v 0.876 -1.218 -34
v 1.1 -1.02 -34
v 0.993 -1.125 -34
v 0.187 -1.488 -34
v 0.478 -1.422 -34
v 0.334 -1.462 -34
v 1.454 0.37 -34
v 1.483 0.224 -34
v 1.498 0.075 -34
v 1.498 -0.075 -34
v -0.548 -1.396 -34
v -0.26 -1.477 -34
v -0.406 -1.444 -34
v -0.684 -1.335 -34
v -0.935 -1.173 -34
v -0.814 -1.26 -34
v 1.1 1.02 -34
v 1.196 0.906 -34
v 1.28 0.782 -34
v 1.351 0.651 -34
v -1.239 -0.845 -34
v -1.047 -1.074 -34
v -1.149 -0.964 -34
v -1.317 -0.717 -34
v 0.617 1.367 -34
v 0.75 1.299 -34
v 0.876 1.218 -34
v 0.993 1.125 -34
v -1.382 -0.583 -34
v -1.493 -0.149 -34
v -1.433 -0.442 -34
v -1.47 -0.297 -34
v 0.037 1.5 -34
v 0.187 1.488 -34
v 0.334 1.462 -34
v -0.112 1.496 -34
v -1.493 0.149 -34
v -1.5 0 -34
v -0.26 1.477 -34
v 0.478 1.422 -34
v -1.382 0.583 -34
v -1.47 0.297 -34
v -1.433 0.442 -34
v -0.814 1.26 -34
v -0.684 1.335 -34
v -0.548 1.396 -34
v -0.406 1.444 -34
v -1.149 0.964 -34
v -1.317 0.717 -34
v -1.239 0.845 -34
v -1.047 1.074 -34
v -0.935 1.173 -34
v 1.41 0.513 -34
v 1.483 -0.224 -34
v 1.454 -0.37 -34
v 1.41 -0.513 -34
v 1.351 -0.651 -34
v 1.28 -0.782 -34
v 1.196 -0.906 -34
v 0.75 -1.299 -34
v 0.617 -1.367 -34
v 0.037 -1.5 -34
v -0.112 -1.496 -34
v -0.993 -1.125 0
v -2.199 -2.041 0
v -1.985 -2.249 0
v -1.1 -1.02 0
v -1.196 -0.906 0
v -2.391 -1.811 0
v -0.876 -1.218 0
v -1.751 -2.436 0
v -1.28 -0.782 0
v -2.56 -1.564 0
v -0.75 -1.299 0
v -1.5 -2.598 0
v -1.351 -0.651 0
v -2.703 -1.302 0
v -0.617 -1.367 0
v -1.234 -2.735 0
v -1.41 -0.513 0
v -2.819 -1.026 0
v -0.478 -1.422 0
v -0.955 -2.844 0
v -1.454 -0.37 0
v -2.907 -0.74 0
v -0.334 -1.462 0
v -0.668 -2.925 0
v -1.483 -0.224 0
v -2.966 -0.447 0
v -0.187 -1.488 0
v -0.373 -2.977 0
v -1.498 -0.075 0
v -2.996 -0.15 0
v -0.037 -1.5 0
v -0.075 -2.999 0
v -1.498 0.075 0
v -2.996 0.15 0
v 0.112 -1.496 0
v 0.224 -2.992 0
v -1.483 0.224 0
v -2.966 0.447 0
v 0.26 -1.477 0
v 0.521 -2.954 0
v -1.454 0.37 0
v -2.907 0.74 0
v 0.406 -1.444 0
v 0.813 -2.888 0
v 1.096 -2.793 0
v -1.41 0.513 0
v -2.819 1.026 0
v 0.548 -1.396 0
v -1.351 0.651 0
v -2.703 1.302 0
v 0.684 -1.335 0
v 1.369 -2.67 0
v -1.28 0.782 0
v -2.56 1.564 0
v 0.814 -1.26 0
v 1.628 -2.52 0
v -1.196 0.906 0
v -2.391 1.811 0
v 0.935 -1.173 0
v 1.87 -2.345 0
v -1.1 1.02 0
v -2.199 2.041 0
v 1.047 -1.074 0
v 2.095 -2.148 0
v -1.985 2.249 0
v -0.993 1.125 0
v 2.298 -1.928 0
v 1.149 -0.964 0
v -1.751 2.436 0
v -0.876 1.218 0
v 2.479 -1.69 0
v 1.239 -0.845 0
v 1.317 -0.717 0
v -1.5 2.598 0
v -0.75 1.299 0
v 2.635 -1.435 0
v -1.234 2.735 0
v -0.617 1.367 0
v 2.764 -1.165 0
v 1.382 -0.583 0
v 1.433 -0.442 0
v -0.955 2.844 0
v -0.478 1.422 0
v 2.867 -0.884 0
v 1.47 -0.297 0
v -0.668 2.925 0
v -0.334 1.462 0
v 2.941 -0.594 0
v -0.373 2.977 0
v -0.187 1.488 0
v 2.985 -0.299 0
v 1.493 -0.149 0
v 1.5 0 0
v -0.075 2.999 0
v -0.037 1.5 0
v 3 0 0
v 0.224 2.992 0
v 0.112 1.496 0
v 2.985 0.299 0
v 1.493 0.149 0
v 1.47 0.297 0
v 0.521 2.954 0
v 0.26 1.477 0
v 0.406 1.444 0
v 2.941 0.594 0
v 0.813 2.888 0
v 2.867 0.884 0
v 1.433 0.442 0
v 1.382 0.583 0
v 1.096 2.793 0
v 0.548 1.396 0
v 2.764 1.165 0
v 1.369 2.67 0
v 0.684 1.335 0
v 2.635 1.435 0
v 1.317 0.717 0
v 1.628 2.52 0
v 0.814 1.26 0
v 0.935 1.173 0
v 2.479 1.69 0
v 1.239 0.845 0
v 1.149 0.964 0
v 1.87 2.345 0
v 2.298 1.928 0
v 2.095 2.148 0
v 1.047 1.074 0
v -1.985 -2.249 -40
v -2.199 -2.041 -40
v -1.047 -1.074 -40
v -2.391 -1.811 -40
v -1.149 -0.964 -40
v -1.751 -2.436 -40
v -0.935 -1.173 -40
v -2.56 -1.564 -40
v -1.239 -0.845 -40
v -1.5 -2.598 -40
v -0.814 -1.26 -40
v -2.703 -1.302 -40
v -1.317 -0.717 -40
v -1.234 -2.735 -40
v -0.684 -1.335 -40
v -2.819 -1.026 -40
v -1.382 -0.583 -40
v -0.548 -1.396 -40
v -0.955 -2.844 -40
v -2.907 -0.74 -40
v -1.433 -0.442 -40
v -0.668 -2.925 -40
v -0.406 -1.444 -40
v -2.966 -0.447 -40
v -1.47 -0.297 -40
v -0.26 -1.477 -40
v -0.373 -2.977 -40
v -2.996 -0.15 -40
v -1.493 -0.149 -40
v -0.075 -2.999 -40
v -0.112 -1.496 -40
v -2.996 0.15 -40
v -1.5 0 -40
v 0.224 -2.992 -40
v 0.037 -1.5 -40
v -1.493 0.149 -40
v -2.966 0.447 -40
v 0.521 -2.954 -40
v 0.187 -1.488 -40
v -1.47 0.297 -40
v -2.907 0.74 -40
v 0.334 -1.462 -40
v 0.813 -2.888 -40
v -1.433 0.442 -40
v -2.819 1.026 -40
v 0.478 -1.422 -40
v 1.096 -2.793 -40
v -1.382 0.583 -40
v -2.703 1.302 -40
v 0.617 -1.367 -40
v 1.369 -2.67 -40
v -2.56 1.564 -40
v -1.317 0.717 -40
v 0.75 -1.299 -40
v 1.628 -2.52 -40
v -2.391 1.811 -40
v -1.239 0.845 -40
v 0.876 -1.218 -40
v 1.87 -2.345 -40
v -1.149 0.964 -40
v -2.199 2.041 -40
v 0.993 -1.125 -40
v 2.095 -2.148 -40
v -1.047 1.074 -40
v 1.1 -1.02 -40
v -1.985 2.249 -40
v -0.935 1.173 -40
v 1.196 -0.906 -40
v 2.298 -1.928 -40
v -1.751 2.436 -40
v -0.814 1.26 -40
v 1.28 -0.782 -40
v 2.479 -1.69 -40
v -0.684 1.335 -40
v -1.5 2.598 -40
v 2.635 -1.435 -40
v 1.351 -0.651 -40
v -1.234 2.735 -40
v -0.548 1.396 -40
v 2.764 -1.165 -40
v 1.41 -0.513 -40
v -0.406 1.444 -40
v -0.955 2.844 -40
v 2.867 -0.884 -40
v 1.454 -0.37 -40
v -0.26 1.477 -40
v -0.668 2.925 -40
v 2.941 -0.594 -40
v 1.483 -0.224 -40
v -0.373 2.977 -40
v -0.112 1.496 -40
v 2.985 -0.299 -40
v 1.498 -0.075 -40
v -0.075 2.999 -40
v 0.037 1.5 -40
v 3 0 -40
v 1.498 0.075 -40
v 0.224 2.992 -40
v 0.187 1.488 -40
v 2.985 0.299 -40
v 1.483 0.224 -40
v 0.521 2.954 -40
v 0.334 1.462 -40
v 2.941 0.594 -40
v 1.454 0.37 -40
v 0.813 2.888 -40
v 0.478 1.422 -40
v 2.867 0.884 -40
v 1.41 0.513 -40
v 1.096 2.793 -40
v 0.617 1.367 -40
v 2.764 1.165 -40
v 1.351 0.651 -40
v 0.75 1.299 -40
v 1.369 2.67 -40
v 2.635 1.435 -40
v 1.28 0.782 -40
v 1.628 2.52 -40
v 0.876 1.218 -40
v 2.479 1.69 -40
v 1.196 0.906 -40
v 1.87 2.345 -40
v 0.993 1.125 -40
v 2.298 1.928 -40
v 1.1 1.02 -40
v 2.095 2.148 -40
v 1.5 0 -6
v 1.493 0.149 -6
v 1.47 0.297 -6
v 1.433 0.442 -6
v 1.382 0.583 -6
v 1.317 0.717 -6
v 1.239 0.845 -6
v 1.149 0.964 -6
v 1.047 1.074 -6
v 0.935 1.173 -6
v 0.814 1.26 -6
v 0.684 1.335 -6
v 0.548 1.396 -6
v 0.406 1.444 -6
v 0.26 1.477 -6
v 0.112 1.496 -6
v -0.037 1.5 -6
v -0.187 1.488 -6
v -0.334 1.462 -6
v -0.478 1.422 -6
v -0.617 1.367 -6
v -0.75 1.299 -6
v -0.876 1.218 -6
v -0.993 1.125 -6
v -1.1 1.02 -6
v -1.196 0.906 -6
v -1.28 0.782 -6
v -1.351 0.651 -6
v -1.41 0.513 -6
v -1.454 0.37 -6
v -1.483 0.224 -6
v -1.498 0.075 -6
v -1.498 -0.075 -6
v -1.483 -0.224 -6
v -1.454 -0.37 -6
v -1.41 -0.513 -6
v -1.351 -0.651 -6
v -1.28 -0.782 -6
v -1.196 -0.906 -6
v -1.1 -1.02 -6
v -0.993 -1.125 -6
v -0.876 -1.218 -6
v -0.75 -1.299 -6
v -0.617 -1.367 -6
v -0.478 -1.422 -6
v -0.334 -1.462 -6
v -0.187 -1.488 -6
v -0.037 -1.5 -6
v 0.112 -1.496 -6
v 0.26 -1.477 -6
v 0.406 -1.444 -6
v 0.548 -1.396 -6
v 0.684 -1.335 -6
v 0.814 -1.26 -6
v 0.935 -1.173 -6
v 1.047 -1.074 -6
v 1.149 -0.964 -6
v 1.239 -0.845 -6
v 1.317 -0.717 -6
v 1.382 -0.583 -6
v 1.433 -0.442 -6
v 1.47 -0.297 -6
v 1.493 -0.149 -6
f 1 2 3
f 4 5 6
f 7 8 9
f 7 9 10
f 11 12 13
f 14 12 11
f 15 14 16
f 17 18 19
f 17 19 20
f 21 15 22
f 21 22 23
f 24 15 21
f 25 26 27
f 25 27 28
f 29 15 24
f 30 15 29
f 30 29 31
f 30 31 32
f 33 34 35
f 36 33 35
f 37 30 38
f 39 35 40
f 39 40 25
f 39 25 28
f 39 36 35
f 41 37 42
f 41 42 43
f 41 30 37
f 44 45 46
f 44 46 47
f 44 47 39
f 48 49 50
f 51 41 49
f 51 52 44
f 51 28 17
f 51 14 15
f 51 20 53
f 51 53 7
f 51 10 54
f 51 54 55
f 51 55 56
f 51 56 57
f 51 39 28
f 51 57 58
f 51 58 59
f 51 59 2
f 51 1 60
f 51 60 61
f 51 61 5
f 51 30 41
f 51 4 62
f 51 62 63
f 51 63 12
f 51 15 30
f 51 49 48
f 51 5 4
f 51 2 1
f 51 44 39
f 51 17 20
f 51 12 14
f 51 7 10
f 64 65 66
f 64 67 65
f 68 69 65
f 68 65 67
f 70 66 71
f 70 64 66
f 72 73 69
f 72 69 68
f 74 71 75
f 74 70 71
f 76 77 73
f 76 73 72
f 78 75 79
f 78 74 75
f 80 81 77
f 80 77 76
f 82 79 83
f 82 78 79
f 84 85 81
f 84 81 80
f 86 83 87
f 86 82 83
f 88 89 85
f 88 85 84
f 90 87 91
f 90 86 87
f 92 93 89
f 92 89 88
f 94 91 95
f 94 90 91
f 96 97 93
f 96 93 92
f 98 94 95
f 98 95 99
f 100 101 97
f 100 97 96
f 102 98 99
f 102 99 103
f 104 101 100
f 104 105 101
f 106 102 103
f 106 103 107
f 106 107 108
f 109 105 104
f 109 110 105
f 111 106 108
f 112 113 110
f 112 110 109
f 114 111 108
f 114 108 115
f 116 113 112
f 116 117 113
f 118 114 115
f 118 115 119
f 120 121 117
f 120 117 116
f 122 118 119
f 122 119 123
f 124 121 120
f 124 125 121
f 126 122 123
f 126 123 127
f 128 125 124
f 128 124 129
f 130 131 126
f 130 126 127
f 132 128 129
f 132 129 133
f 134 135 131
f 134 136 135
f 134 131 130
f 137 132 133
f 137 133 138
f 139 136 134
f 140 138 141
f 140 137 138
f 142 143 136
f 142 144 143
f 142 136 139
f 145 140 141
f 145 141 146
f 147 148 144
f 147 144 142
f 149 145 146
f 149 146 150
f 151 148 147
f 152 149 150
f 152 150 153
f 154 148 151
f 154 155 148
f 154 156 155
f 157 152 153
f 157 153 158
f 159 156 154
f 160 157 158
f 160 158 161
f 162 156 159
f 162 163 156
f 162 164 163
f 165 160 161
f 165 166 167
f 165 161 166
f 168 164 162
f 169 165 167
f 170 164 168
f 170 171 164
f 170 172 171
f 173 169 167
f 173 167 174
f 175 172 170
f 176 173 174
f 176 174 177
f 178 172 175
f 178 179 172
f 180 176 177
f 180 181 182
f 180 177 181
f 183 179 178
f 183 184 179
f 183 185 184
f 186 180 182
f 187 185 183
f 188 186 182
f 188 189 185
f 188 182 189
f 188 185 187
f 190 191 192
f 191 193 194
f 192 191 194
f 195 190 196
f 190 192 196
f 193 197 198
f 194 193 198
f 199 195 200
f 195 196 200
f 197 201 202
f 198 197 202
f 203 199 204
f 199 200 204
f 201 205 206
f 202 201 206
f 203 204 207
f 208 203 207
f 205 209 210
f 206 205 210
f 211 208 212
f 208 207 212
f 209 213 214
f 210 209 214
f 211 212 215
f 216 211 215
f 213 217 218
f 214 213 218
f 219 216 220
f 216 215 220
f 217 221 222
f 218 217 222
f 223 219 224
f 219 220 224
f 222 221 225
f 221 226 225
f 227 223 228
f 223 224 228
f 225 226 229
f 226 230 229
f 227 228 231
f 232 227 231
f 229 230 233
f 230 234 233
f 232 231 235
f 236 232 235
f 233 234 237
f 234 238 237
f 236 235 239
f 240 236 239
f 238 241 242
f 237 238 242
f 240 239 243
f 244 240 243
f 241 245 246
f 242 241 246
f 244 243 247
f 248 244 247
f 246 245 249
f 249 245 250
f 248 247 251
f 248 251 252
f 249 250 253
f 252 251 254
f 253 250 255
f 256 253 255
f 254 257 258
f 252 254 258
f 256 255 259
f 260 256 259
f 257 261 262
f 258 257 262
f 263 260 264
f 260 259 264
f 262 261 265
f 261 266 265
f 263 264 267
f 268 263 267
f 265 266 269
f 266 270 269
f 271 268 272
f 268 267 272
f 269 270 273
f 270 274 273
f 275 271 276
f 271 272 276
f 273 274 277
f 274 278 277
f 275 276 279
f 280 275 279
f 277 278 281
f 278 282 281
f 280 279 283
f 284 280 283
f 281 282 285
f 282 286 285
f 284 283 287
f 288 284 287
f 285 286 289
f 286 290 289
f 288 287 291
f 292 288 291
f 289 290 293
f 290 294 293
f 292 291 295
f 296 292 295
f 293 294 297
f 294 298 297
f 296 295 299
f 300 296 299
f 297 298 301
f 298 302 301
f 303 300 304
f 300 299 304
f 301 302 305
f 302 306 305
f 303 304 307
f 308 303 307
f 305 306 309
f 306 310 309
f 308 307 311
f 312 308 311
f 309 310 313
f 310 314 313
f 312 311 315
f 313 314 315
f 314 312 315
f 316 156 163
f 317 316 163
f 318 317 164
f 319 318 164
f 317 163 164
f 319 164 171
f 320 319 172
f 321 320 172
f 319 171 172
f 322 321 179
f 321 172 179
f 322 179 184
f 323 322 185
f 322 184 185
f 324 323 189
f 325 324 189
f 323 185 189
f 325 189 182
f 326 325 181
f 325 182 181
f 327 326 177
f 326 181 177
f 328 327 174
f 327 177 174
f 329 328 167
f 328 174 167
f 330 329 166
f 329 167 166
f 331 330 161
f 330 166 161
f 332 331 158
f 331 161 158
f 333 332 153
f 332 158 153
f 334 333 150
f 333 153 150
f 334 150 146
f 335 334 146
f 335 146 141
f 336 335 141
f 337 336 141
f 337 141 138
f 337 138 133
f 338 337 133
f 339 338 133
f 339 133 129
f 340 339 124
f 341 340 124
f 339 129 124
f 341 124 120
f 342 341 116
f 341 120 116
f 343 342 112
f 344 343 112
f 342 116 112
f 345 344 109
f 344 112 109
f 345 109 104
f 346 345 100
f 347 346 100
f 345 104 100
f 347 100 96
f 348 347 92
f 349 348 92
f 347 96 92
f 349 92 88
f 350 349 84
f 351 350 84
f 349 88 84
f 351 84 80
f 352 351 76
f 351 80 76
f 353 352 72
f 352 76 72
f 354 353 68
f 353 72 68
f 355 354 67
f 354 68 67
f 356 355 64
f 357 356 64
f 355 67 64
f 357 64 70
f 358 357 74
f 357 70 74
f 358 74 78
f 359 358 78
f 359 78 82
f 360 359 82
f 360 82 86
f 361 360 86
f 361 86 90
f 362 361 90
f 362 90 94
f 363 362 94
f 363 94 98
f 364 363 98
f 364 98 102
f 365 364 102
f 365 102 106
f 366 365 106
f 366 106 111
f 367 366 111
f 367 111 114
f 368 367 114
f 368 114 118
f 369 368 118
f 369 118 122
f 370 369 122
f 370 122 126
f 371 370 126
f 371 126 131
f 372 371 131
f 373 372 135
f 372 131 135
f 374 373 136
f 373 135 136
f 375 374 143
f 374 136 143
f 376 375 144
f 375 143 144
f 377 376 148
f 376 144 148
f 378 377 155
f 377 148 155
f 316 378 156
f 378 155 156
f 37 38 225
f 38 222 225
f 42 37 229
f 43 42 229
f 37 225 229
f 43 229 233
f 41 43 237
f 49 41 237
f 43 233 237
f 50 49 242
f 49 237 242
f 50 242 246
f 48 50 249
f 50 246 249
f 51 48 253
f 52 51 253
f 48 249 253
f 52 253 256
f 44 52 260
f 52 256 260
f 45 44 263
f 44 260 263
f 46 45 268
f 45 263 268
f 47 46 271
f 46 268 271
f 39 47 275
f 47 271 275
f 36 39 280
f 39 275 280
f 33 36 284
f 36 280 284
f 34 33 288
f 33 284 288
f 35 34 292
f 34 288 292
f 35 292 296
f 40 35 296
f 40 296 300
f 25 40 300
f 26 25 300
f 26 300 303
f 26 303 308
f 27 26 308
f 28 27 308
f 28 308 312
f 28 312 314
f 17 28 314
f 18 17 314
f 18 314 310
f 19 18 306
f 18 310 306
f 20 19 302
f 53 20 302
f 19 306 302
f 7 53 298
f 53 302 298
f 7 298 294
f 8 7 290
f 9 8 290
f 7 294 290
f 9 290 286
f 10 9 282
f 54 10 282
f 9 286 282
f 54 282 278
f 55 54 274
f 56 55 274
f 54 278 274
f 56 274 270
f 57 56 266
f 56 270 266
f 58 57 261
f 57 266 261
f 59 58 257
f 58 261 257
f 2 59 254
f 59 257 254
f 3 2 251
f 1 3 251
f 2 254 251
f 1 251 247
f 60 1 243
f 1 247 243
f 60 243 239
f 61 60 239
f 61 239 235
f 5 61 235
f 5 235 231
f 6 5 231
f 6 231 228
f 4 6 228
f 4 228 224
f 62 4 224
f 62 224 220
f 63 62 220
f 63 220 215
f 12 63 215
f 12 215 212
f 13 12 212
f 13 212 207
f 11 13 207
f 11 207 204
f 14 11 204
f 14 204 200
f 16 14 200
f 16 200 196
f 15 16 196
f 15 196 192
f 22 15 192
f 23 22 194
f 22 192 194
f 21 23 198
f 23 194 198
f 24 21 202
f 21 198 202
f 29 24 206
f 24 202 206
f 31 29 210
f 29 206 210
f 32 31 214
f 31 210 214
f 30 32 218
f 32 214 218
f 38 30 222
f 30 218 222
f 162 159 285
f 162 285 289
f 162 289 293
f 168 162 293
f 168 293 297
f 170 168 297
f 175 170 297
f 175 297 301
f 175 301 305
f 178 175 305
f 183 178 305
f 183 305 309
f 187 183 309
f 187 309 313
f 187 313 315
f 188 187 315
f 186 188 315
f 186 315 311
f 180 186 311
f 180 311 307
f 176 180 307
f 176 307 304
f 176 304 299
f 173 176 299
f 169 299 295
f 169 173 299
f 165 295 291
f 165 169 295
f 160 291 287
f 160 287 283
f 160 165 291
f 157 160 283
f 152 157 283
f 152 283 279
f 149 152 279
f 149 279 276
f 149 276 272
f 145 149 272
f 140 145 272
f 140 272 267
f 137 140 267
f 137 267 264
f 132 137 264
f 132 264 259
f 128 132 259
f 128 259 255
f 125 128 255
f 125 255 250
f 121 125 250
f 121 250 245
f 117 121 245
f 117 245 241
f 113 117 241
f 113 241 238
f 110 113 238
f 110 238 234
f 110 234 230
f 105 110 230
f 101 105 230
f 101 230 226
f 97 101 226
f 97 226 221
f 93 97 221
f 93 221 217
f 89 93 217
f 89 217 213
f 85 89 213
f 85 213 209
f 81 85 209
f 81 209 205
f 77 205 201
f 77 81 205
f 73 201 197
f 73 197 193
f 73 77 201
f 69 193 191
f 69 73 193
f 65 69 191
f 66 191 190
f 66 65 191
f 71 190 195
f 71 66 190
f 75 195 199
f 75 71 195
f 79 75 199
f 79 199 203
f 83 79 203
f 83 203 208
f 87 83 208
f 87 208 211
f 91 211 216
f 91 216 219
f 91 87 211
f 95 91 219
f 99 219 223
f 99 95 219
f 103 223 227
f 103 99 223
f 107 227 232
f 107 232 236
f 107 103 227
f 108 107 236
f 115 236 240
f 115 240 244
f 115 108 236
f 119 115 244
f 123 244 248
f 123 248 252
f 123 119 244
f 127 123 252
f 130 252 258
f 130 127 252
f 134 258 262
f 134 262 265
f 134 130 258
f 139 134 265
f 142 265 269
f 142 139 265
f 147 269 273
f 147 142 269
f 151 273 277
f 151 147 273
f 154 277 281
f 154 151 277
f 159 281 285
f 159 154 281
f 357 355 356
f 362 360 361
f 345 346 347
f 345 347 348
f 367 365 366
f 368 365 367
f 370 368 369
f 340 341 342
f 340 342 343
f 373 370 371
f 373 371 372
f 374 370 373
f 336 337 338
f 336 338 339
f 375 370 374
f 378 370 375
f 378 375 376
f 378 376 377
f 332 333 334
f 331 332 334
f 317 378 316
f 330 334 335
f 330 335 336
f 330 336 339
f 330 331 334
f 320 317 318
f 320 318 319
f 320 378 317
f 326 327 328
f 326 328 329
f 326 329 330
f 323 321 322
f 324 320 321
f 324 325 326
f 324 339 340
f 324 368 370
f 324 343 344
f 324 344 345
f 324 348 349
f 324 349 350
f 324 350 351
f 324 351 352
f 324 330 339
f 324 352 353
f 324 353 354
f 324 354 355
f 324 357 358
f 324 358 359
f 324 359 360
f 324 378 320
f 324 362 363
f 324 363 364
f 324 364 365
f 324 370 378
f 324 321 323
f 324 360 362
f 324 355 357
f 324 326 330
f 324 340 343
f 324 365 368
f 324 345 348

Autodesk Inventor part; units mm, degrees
ref_plane "YZ Plane" through (0, 0, 0) normal (1, 0, 0) x (0, 1, 0)
ref_plane "XZ Plane" through (0, 0, 0) normal (0, 1, 0) x (-1, 0, 0)
ref_plane "XY Plane" through (0, 0, 0) normal (0, 0, 1) x (1, 0, 0)
sketch "Sketch1" plane through (0, 0, 0) normal (0, 0, 1) x (1, 0, 0)
  circle A0 centre (0, 0) radius 1.25
  circle A1 centre (0, 0) radius 3
  dimension "d0" = 2.5
  dimension "d1" = 6
extrude "Extrusion1" add sketch "Sketch1" against normal blind 40 contours A0 | A1
sketch "スケッチ2" plane through (0, 0, 0) normal (0, 0, 1) x (1, 0, 0)
  circle A0 centre (0, 0) radius 1.5
  dimension "d4" = 3
extrude "押し出し2" cut sketch "スケッチ2" against normal blind 6
sketch "スケッチ3" plane through (0, 0, -40) normal (0, 0, -1) x (-1, 0, 0)
  circle A0 centre (0, 0) radius 1.5 projected
extrude "押し出し3" cut sketch "スケッチ3" against normal blind 6
properties part number "l40" material "Aluminum 2014-T4"
